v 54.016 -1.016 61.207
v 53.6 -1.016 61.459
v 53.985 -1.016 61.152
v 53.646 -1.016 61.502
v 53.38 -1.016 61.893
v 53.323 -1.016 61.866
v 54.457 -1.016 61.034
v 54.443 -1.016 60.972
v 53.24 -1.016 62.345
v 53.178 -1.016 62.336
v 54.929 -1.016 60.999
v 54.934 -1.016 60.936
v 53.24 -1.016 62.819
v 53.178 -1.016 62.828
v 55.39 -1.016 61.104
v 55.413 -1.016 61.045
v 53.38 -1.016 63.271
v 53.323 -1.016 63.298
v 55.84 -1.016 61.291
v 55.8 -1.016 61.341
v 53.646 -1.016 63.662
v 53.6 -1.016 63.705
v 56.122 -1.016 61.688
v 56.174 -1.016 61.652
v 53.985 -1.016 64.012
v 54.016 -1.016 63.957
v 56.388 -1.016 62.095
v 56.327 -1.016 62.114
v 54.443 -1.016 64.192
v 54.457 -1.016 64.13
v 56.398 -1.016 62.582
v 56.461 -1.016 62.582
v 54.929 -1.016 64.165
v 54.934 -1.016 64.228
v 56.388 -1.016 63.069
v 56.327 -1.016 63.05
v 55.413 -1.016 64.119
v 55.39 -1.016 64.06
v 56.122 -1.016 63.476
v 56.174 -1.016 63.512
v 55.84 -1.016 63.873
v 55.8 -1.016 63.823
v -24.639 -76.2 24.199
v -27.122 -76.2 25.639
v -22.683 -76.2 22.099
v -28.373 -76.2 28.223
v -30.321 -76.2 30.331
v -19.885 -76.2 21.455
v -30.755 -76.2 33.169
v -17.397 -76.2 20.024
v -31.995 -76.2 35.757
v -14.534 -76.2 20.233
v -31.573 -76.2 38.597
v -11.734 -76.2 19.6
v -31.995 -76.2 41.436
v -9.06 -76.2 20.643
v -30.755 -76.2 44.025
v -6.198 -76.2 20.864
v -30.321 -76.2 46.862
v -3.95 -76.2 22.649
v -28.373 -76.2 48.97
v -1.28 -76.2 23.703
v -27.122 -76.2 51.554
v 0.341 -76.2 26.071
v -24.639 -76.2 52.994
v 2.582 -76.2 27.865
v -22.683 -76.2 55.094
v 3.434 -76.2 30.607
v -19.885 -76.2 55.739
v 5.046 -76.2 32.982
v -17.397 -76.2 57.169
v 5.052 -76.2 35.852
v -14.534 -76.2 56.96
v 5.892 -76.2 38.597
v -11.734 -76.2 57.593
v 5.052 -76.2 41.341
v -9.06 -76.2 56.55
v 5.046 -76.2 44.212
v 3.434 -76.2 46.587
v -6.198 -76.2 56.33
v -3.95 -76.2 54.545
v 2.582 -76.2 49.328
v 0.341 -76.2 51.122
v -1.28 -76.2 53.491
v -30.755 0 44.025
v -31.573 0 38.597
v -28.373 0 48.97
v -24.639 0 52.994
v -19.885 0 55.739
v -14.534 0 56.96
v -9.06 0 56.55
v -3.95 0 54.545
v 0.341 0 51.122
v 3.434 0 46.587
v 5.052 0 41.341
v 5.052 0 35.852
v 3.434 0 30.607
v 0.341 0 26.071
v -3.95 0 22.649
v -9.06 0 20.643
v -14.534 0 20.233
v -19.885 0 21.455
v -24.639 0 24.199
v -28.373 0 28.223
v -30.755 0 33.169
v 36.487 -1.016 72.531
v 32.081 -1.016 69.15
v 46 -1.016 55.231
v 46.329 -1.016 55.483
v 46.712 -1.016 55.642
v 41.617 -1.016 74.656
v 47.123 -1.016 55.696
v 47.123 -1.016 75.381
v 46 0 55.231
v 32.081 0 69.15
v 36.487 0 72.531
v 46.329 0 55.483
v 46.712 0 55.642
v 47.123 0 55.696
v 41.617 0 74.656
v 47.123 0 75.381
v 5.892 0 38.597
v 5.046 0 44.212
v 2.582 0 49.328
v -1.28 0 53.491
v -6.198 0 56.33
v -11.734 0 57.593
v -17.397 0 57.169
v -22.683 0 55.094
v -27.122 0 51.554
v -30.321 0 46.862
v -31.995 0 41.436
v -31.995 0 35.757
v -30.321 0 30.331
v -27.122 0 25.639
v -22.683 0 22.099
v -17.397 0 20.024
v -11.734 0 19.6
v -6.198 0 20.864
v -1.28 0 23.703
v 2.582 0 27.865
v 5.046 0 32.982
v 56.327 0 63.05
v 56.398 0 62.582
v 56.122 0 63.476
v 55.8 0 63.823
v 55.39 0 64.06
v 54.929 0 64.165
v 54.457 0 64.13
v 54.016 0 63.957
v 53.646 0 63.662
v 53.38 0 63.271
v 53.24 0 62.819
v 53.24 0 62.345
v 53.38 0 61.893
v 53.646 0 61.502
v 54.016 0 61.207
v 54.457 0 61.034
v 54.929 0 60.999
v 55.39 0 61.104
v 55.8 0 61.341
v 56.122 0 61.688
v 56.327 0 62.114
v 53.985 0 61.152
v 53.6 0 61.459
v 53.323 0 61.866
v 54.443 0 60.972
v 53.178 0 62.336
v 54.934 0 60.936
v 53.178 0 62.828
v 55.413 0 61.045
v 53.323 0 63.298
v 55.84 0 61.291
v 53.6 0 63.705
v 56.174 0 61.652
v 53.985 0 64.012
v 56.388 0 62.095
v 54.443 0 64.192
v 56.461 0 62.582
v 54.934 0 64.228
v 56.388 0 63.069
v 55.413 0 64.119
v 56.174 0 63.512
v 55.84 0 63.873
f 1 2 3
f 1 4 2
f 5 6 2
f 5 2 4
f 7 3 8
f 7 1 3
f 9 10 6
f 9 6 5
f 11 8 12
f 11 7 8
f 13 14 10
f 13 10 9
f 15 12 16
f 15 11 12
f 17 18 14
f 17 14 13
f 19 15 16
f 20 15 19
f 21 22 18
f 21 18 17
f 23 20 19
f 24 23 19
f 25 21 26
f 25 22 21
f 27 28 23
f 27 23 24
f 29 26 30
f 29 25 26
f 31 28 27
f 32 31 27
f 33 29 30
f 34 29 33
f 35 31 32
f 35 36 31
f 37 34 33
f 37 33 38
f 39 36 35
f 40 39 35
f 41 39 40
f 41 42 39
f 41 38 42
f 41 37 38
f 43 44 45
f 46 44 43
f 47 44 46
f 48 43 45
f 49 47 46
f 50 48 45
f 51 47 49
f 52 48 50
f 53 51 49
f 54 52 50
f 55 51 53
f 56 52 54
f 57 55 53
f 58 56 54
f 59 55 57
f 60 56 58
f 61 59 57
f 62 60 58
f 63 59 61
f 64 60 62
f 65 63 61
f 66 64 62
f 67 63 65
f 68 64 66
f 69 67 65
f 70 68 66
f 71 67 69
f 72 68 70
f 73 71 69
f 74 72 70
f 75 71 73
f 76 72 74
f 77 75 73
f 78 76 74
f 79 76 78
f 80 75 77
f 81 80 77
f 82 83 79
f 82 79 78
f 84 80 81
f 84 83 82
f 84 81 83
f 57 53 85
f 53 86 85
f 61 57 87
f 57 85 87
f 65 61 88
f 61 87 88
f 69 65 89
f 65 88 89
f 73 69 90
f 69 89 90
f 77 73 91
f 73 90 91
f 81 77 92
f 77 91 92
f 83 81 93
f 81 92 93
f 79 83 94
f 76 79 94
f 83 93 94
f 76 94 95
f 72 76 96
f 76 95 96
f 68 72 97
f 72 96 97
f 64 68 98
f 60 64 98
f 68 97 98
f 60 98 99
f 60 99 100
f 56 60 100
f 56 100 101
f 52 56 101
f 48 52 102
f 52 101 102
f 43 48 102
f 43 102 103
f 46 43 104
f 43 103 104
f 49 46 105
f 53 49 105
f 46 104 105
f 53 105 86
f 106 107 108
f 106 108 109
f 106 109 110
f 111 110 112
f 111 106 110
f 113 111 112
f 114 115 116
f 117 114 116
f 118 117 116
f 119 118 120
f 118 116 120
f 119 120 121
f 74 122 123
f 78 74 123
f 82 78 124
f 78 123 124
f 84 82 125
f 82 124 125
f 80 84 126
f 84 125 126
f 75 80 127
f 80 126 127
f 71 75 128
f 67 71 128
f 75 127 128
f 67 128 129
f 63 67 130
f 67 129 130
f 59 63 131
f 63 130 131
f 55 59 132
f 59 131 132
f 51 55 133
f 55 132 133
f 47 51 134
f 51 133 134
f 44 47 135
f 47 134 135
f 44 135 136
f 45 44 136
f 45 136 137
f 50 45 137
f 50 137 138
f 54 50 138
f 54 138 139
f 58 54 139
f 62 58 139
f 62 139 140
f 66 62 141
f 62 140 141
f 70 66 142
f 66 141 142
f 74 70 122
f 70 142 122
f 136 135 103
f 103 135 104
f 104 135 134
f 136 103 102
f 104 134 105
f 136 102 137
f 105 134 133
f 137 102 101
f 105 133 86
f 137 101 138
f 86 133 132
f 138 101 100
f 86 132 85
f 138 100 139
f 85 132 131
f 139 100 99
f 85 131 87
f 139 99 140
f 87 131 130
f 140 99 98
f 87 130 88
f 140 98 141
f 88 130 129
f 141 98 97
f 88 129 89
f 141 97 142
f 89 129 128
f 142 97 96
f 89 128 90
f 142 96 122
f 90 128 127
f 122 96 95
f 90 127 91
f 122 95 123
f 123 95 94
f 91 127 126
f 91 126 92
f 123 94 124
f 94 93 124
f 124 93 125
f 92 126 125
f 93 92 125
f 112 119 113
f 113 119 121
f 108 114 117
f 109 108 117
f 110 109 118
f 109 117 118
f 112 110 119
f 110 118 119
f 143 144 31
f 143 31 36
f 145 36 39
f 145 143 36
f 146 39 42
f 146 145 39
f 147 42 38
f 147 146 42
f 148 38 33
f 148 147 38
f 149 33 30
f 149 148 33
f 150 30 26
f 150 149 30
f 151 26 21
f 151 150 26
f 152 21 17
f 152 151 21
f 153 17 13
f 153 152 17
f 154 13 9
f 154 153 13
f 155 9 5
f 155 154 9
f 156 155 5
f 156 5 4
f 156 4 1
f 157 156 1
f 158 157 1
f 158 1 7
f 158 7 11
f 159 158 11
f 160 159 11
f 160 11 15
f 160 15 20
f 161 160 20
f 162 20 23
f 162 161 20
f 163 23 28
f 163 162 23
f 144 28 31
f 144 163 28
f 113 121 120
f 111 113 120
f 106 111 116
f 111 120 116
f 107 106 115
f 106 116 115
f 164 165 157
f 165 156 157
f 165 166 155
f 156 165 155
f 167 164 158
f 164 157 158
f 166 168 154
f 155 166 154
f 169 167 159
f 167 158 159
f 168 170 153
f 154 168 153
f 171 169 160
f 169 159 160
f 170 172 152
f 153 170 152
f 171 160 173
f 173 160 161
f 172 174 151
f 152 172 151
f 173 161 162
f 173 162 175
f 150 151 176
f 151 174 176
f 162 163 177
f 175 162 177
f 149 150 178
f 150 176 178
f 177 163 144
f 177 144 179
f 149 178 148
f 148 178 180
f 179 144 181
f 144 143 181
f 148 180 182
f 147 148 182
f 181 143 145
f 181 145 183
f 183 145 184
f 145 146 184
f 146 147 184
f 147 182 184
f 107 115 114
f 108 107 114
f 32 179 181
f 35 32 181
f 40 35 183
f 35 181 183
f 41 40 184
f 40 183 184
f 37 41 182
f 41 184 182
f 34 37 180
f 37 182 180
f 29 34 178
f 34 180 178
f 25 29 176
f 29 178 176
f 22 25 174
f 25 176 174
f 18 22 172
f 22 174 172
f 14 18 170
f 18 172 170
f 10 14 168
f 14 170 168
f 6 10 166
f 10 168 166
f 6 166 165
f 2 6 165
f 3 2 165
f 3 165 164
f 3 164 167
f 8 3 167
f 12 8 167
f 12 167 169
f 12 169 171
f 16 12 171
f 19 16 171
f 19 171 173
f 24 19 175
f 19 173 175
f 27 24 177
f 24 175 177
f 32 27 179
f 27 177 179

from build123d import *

# Parameters (mm, degrees)
F0_R     = 19.05
F1_DEPTH = 76.2
F3_D     = 36.83
F3_DEPTH = 76.2
F3_TIP   = 11.0648482994
F5_DEPTH = 1.016
F8_R     = 1.651
F8_R_2   = 1.5875
F9_DEPTH = 1.016


# Not quite as in the source:
# - a feature of the source that left no trace in its solid (it failed there, or was rolled back) is left out
# - a length typed as a fraction of an inch, garbled in the dataset ("3 / 203.2 mm" for 3/8 in), is restored
# - a feature names something its author has since deleted; it is built from what else it names


with BuildPart() as f1:
    # F0 (on Front) → F1 (new body)
    with BuildSketch(Plane.XZ):
        with Locations((-13.1577122957, 38.5967120528)):
            Circle(F0_R)
    extrude(amount=F1_DEPTH)

    # F3
    with Locations(Plane.XZ.offset(76.2)):
        with Locations((-13.1577122957, 38.5967120528)):
            Hole(F3_D / 2, depth=F3_DEPTH)
            with Locations((0, 0, -(F3_DEPTH + F3_TIP / 2))):  # 118° drill point
                Cone(0, F3_D / 2, F3_TIP, mode=Mode.SUBTRACT)


with BuildPart() as f5:
    # F4 (on Front) → F5 (new body)
    with BuildSketch(Plane.XZ):
        with BuildLine():
            Line((47.1229890541, 55.69569515), (47.1229890541, 75.38069515))
            ThreePointArc((47.1229890541, 75.38069515), (38.9823557391, 73.7614225053), (32.0810600513, 69.1501241528))
            Line((32.0810600513, 69.1501241528), (46.0004570389, 55.2307271651))
            ThreePointArc((46.0004570389, 55.2307271651), (46.5154791052, 55.5748539078), (47.1229890541, 55.69569515))
        make_face()
    extrude(amount=F5_DEPTH)


with BuildPart() as f9:
    # F8 (on Front) → F9 (new body)
    with BuildSketch(Plane.XZ):
        with Locations((54.8101738095, 62.5820532441)):
            Circle(F8_R)
        with Locations((54.8101738095, 62.5820532441)):
            Circle(F8_R_2, mode=Mode.SUBTRACT)
    extrude(amount=F9_DEPTH)


solid = Compound([f1.part, f5.part, f9.part])
